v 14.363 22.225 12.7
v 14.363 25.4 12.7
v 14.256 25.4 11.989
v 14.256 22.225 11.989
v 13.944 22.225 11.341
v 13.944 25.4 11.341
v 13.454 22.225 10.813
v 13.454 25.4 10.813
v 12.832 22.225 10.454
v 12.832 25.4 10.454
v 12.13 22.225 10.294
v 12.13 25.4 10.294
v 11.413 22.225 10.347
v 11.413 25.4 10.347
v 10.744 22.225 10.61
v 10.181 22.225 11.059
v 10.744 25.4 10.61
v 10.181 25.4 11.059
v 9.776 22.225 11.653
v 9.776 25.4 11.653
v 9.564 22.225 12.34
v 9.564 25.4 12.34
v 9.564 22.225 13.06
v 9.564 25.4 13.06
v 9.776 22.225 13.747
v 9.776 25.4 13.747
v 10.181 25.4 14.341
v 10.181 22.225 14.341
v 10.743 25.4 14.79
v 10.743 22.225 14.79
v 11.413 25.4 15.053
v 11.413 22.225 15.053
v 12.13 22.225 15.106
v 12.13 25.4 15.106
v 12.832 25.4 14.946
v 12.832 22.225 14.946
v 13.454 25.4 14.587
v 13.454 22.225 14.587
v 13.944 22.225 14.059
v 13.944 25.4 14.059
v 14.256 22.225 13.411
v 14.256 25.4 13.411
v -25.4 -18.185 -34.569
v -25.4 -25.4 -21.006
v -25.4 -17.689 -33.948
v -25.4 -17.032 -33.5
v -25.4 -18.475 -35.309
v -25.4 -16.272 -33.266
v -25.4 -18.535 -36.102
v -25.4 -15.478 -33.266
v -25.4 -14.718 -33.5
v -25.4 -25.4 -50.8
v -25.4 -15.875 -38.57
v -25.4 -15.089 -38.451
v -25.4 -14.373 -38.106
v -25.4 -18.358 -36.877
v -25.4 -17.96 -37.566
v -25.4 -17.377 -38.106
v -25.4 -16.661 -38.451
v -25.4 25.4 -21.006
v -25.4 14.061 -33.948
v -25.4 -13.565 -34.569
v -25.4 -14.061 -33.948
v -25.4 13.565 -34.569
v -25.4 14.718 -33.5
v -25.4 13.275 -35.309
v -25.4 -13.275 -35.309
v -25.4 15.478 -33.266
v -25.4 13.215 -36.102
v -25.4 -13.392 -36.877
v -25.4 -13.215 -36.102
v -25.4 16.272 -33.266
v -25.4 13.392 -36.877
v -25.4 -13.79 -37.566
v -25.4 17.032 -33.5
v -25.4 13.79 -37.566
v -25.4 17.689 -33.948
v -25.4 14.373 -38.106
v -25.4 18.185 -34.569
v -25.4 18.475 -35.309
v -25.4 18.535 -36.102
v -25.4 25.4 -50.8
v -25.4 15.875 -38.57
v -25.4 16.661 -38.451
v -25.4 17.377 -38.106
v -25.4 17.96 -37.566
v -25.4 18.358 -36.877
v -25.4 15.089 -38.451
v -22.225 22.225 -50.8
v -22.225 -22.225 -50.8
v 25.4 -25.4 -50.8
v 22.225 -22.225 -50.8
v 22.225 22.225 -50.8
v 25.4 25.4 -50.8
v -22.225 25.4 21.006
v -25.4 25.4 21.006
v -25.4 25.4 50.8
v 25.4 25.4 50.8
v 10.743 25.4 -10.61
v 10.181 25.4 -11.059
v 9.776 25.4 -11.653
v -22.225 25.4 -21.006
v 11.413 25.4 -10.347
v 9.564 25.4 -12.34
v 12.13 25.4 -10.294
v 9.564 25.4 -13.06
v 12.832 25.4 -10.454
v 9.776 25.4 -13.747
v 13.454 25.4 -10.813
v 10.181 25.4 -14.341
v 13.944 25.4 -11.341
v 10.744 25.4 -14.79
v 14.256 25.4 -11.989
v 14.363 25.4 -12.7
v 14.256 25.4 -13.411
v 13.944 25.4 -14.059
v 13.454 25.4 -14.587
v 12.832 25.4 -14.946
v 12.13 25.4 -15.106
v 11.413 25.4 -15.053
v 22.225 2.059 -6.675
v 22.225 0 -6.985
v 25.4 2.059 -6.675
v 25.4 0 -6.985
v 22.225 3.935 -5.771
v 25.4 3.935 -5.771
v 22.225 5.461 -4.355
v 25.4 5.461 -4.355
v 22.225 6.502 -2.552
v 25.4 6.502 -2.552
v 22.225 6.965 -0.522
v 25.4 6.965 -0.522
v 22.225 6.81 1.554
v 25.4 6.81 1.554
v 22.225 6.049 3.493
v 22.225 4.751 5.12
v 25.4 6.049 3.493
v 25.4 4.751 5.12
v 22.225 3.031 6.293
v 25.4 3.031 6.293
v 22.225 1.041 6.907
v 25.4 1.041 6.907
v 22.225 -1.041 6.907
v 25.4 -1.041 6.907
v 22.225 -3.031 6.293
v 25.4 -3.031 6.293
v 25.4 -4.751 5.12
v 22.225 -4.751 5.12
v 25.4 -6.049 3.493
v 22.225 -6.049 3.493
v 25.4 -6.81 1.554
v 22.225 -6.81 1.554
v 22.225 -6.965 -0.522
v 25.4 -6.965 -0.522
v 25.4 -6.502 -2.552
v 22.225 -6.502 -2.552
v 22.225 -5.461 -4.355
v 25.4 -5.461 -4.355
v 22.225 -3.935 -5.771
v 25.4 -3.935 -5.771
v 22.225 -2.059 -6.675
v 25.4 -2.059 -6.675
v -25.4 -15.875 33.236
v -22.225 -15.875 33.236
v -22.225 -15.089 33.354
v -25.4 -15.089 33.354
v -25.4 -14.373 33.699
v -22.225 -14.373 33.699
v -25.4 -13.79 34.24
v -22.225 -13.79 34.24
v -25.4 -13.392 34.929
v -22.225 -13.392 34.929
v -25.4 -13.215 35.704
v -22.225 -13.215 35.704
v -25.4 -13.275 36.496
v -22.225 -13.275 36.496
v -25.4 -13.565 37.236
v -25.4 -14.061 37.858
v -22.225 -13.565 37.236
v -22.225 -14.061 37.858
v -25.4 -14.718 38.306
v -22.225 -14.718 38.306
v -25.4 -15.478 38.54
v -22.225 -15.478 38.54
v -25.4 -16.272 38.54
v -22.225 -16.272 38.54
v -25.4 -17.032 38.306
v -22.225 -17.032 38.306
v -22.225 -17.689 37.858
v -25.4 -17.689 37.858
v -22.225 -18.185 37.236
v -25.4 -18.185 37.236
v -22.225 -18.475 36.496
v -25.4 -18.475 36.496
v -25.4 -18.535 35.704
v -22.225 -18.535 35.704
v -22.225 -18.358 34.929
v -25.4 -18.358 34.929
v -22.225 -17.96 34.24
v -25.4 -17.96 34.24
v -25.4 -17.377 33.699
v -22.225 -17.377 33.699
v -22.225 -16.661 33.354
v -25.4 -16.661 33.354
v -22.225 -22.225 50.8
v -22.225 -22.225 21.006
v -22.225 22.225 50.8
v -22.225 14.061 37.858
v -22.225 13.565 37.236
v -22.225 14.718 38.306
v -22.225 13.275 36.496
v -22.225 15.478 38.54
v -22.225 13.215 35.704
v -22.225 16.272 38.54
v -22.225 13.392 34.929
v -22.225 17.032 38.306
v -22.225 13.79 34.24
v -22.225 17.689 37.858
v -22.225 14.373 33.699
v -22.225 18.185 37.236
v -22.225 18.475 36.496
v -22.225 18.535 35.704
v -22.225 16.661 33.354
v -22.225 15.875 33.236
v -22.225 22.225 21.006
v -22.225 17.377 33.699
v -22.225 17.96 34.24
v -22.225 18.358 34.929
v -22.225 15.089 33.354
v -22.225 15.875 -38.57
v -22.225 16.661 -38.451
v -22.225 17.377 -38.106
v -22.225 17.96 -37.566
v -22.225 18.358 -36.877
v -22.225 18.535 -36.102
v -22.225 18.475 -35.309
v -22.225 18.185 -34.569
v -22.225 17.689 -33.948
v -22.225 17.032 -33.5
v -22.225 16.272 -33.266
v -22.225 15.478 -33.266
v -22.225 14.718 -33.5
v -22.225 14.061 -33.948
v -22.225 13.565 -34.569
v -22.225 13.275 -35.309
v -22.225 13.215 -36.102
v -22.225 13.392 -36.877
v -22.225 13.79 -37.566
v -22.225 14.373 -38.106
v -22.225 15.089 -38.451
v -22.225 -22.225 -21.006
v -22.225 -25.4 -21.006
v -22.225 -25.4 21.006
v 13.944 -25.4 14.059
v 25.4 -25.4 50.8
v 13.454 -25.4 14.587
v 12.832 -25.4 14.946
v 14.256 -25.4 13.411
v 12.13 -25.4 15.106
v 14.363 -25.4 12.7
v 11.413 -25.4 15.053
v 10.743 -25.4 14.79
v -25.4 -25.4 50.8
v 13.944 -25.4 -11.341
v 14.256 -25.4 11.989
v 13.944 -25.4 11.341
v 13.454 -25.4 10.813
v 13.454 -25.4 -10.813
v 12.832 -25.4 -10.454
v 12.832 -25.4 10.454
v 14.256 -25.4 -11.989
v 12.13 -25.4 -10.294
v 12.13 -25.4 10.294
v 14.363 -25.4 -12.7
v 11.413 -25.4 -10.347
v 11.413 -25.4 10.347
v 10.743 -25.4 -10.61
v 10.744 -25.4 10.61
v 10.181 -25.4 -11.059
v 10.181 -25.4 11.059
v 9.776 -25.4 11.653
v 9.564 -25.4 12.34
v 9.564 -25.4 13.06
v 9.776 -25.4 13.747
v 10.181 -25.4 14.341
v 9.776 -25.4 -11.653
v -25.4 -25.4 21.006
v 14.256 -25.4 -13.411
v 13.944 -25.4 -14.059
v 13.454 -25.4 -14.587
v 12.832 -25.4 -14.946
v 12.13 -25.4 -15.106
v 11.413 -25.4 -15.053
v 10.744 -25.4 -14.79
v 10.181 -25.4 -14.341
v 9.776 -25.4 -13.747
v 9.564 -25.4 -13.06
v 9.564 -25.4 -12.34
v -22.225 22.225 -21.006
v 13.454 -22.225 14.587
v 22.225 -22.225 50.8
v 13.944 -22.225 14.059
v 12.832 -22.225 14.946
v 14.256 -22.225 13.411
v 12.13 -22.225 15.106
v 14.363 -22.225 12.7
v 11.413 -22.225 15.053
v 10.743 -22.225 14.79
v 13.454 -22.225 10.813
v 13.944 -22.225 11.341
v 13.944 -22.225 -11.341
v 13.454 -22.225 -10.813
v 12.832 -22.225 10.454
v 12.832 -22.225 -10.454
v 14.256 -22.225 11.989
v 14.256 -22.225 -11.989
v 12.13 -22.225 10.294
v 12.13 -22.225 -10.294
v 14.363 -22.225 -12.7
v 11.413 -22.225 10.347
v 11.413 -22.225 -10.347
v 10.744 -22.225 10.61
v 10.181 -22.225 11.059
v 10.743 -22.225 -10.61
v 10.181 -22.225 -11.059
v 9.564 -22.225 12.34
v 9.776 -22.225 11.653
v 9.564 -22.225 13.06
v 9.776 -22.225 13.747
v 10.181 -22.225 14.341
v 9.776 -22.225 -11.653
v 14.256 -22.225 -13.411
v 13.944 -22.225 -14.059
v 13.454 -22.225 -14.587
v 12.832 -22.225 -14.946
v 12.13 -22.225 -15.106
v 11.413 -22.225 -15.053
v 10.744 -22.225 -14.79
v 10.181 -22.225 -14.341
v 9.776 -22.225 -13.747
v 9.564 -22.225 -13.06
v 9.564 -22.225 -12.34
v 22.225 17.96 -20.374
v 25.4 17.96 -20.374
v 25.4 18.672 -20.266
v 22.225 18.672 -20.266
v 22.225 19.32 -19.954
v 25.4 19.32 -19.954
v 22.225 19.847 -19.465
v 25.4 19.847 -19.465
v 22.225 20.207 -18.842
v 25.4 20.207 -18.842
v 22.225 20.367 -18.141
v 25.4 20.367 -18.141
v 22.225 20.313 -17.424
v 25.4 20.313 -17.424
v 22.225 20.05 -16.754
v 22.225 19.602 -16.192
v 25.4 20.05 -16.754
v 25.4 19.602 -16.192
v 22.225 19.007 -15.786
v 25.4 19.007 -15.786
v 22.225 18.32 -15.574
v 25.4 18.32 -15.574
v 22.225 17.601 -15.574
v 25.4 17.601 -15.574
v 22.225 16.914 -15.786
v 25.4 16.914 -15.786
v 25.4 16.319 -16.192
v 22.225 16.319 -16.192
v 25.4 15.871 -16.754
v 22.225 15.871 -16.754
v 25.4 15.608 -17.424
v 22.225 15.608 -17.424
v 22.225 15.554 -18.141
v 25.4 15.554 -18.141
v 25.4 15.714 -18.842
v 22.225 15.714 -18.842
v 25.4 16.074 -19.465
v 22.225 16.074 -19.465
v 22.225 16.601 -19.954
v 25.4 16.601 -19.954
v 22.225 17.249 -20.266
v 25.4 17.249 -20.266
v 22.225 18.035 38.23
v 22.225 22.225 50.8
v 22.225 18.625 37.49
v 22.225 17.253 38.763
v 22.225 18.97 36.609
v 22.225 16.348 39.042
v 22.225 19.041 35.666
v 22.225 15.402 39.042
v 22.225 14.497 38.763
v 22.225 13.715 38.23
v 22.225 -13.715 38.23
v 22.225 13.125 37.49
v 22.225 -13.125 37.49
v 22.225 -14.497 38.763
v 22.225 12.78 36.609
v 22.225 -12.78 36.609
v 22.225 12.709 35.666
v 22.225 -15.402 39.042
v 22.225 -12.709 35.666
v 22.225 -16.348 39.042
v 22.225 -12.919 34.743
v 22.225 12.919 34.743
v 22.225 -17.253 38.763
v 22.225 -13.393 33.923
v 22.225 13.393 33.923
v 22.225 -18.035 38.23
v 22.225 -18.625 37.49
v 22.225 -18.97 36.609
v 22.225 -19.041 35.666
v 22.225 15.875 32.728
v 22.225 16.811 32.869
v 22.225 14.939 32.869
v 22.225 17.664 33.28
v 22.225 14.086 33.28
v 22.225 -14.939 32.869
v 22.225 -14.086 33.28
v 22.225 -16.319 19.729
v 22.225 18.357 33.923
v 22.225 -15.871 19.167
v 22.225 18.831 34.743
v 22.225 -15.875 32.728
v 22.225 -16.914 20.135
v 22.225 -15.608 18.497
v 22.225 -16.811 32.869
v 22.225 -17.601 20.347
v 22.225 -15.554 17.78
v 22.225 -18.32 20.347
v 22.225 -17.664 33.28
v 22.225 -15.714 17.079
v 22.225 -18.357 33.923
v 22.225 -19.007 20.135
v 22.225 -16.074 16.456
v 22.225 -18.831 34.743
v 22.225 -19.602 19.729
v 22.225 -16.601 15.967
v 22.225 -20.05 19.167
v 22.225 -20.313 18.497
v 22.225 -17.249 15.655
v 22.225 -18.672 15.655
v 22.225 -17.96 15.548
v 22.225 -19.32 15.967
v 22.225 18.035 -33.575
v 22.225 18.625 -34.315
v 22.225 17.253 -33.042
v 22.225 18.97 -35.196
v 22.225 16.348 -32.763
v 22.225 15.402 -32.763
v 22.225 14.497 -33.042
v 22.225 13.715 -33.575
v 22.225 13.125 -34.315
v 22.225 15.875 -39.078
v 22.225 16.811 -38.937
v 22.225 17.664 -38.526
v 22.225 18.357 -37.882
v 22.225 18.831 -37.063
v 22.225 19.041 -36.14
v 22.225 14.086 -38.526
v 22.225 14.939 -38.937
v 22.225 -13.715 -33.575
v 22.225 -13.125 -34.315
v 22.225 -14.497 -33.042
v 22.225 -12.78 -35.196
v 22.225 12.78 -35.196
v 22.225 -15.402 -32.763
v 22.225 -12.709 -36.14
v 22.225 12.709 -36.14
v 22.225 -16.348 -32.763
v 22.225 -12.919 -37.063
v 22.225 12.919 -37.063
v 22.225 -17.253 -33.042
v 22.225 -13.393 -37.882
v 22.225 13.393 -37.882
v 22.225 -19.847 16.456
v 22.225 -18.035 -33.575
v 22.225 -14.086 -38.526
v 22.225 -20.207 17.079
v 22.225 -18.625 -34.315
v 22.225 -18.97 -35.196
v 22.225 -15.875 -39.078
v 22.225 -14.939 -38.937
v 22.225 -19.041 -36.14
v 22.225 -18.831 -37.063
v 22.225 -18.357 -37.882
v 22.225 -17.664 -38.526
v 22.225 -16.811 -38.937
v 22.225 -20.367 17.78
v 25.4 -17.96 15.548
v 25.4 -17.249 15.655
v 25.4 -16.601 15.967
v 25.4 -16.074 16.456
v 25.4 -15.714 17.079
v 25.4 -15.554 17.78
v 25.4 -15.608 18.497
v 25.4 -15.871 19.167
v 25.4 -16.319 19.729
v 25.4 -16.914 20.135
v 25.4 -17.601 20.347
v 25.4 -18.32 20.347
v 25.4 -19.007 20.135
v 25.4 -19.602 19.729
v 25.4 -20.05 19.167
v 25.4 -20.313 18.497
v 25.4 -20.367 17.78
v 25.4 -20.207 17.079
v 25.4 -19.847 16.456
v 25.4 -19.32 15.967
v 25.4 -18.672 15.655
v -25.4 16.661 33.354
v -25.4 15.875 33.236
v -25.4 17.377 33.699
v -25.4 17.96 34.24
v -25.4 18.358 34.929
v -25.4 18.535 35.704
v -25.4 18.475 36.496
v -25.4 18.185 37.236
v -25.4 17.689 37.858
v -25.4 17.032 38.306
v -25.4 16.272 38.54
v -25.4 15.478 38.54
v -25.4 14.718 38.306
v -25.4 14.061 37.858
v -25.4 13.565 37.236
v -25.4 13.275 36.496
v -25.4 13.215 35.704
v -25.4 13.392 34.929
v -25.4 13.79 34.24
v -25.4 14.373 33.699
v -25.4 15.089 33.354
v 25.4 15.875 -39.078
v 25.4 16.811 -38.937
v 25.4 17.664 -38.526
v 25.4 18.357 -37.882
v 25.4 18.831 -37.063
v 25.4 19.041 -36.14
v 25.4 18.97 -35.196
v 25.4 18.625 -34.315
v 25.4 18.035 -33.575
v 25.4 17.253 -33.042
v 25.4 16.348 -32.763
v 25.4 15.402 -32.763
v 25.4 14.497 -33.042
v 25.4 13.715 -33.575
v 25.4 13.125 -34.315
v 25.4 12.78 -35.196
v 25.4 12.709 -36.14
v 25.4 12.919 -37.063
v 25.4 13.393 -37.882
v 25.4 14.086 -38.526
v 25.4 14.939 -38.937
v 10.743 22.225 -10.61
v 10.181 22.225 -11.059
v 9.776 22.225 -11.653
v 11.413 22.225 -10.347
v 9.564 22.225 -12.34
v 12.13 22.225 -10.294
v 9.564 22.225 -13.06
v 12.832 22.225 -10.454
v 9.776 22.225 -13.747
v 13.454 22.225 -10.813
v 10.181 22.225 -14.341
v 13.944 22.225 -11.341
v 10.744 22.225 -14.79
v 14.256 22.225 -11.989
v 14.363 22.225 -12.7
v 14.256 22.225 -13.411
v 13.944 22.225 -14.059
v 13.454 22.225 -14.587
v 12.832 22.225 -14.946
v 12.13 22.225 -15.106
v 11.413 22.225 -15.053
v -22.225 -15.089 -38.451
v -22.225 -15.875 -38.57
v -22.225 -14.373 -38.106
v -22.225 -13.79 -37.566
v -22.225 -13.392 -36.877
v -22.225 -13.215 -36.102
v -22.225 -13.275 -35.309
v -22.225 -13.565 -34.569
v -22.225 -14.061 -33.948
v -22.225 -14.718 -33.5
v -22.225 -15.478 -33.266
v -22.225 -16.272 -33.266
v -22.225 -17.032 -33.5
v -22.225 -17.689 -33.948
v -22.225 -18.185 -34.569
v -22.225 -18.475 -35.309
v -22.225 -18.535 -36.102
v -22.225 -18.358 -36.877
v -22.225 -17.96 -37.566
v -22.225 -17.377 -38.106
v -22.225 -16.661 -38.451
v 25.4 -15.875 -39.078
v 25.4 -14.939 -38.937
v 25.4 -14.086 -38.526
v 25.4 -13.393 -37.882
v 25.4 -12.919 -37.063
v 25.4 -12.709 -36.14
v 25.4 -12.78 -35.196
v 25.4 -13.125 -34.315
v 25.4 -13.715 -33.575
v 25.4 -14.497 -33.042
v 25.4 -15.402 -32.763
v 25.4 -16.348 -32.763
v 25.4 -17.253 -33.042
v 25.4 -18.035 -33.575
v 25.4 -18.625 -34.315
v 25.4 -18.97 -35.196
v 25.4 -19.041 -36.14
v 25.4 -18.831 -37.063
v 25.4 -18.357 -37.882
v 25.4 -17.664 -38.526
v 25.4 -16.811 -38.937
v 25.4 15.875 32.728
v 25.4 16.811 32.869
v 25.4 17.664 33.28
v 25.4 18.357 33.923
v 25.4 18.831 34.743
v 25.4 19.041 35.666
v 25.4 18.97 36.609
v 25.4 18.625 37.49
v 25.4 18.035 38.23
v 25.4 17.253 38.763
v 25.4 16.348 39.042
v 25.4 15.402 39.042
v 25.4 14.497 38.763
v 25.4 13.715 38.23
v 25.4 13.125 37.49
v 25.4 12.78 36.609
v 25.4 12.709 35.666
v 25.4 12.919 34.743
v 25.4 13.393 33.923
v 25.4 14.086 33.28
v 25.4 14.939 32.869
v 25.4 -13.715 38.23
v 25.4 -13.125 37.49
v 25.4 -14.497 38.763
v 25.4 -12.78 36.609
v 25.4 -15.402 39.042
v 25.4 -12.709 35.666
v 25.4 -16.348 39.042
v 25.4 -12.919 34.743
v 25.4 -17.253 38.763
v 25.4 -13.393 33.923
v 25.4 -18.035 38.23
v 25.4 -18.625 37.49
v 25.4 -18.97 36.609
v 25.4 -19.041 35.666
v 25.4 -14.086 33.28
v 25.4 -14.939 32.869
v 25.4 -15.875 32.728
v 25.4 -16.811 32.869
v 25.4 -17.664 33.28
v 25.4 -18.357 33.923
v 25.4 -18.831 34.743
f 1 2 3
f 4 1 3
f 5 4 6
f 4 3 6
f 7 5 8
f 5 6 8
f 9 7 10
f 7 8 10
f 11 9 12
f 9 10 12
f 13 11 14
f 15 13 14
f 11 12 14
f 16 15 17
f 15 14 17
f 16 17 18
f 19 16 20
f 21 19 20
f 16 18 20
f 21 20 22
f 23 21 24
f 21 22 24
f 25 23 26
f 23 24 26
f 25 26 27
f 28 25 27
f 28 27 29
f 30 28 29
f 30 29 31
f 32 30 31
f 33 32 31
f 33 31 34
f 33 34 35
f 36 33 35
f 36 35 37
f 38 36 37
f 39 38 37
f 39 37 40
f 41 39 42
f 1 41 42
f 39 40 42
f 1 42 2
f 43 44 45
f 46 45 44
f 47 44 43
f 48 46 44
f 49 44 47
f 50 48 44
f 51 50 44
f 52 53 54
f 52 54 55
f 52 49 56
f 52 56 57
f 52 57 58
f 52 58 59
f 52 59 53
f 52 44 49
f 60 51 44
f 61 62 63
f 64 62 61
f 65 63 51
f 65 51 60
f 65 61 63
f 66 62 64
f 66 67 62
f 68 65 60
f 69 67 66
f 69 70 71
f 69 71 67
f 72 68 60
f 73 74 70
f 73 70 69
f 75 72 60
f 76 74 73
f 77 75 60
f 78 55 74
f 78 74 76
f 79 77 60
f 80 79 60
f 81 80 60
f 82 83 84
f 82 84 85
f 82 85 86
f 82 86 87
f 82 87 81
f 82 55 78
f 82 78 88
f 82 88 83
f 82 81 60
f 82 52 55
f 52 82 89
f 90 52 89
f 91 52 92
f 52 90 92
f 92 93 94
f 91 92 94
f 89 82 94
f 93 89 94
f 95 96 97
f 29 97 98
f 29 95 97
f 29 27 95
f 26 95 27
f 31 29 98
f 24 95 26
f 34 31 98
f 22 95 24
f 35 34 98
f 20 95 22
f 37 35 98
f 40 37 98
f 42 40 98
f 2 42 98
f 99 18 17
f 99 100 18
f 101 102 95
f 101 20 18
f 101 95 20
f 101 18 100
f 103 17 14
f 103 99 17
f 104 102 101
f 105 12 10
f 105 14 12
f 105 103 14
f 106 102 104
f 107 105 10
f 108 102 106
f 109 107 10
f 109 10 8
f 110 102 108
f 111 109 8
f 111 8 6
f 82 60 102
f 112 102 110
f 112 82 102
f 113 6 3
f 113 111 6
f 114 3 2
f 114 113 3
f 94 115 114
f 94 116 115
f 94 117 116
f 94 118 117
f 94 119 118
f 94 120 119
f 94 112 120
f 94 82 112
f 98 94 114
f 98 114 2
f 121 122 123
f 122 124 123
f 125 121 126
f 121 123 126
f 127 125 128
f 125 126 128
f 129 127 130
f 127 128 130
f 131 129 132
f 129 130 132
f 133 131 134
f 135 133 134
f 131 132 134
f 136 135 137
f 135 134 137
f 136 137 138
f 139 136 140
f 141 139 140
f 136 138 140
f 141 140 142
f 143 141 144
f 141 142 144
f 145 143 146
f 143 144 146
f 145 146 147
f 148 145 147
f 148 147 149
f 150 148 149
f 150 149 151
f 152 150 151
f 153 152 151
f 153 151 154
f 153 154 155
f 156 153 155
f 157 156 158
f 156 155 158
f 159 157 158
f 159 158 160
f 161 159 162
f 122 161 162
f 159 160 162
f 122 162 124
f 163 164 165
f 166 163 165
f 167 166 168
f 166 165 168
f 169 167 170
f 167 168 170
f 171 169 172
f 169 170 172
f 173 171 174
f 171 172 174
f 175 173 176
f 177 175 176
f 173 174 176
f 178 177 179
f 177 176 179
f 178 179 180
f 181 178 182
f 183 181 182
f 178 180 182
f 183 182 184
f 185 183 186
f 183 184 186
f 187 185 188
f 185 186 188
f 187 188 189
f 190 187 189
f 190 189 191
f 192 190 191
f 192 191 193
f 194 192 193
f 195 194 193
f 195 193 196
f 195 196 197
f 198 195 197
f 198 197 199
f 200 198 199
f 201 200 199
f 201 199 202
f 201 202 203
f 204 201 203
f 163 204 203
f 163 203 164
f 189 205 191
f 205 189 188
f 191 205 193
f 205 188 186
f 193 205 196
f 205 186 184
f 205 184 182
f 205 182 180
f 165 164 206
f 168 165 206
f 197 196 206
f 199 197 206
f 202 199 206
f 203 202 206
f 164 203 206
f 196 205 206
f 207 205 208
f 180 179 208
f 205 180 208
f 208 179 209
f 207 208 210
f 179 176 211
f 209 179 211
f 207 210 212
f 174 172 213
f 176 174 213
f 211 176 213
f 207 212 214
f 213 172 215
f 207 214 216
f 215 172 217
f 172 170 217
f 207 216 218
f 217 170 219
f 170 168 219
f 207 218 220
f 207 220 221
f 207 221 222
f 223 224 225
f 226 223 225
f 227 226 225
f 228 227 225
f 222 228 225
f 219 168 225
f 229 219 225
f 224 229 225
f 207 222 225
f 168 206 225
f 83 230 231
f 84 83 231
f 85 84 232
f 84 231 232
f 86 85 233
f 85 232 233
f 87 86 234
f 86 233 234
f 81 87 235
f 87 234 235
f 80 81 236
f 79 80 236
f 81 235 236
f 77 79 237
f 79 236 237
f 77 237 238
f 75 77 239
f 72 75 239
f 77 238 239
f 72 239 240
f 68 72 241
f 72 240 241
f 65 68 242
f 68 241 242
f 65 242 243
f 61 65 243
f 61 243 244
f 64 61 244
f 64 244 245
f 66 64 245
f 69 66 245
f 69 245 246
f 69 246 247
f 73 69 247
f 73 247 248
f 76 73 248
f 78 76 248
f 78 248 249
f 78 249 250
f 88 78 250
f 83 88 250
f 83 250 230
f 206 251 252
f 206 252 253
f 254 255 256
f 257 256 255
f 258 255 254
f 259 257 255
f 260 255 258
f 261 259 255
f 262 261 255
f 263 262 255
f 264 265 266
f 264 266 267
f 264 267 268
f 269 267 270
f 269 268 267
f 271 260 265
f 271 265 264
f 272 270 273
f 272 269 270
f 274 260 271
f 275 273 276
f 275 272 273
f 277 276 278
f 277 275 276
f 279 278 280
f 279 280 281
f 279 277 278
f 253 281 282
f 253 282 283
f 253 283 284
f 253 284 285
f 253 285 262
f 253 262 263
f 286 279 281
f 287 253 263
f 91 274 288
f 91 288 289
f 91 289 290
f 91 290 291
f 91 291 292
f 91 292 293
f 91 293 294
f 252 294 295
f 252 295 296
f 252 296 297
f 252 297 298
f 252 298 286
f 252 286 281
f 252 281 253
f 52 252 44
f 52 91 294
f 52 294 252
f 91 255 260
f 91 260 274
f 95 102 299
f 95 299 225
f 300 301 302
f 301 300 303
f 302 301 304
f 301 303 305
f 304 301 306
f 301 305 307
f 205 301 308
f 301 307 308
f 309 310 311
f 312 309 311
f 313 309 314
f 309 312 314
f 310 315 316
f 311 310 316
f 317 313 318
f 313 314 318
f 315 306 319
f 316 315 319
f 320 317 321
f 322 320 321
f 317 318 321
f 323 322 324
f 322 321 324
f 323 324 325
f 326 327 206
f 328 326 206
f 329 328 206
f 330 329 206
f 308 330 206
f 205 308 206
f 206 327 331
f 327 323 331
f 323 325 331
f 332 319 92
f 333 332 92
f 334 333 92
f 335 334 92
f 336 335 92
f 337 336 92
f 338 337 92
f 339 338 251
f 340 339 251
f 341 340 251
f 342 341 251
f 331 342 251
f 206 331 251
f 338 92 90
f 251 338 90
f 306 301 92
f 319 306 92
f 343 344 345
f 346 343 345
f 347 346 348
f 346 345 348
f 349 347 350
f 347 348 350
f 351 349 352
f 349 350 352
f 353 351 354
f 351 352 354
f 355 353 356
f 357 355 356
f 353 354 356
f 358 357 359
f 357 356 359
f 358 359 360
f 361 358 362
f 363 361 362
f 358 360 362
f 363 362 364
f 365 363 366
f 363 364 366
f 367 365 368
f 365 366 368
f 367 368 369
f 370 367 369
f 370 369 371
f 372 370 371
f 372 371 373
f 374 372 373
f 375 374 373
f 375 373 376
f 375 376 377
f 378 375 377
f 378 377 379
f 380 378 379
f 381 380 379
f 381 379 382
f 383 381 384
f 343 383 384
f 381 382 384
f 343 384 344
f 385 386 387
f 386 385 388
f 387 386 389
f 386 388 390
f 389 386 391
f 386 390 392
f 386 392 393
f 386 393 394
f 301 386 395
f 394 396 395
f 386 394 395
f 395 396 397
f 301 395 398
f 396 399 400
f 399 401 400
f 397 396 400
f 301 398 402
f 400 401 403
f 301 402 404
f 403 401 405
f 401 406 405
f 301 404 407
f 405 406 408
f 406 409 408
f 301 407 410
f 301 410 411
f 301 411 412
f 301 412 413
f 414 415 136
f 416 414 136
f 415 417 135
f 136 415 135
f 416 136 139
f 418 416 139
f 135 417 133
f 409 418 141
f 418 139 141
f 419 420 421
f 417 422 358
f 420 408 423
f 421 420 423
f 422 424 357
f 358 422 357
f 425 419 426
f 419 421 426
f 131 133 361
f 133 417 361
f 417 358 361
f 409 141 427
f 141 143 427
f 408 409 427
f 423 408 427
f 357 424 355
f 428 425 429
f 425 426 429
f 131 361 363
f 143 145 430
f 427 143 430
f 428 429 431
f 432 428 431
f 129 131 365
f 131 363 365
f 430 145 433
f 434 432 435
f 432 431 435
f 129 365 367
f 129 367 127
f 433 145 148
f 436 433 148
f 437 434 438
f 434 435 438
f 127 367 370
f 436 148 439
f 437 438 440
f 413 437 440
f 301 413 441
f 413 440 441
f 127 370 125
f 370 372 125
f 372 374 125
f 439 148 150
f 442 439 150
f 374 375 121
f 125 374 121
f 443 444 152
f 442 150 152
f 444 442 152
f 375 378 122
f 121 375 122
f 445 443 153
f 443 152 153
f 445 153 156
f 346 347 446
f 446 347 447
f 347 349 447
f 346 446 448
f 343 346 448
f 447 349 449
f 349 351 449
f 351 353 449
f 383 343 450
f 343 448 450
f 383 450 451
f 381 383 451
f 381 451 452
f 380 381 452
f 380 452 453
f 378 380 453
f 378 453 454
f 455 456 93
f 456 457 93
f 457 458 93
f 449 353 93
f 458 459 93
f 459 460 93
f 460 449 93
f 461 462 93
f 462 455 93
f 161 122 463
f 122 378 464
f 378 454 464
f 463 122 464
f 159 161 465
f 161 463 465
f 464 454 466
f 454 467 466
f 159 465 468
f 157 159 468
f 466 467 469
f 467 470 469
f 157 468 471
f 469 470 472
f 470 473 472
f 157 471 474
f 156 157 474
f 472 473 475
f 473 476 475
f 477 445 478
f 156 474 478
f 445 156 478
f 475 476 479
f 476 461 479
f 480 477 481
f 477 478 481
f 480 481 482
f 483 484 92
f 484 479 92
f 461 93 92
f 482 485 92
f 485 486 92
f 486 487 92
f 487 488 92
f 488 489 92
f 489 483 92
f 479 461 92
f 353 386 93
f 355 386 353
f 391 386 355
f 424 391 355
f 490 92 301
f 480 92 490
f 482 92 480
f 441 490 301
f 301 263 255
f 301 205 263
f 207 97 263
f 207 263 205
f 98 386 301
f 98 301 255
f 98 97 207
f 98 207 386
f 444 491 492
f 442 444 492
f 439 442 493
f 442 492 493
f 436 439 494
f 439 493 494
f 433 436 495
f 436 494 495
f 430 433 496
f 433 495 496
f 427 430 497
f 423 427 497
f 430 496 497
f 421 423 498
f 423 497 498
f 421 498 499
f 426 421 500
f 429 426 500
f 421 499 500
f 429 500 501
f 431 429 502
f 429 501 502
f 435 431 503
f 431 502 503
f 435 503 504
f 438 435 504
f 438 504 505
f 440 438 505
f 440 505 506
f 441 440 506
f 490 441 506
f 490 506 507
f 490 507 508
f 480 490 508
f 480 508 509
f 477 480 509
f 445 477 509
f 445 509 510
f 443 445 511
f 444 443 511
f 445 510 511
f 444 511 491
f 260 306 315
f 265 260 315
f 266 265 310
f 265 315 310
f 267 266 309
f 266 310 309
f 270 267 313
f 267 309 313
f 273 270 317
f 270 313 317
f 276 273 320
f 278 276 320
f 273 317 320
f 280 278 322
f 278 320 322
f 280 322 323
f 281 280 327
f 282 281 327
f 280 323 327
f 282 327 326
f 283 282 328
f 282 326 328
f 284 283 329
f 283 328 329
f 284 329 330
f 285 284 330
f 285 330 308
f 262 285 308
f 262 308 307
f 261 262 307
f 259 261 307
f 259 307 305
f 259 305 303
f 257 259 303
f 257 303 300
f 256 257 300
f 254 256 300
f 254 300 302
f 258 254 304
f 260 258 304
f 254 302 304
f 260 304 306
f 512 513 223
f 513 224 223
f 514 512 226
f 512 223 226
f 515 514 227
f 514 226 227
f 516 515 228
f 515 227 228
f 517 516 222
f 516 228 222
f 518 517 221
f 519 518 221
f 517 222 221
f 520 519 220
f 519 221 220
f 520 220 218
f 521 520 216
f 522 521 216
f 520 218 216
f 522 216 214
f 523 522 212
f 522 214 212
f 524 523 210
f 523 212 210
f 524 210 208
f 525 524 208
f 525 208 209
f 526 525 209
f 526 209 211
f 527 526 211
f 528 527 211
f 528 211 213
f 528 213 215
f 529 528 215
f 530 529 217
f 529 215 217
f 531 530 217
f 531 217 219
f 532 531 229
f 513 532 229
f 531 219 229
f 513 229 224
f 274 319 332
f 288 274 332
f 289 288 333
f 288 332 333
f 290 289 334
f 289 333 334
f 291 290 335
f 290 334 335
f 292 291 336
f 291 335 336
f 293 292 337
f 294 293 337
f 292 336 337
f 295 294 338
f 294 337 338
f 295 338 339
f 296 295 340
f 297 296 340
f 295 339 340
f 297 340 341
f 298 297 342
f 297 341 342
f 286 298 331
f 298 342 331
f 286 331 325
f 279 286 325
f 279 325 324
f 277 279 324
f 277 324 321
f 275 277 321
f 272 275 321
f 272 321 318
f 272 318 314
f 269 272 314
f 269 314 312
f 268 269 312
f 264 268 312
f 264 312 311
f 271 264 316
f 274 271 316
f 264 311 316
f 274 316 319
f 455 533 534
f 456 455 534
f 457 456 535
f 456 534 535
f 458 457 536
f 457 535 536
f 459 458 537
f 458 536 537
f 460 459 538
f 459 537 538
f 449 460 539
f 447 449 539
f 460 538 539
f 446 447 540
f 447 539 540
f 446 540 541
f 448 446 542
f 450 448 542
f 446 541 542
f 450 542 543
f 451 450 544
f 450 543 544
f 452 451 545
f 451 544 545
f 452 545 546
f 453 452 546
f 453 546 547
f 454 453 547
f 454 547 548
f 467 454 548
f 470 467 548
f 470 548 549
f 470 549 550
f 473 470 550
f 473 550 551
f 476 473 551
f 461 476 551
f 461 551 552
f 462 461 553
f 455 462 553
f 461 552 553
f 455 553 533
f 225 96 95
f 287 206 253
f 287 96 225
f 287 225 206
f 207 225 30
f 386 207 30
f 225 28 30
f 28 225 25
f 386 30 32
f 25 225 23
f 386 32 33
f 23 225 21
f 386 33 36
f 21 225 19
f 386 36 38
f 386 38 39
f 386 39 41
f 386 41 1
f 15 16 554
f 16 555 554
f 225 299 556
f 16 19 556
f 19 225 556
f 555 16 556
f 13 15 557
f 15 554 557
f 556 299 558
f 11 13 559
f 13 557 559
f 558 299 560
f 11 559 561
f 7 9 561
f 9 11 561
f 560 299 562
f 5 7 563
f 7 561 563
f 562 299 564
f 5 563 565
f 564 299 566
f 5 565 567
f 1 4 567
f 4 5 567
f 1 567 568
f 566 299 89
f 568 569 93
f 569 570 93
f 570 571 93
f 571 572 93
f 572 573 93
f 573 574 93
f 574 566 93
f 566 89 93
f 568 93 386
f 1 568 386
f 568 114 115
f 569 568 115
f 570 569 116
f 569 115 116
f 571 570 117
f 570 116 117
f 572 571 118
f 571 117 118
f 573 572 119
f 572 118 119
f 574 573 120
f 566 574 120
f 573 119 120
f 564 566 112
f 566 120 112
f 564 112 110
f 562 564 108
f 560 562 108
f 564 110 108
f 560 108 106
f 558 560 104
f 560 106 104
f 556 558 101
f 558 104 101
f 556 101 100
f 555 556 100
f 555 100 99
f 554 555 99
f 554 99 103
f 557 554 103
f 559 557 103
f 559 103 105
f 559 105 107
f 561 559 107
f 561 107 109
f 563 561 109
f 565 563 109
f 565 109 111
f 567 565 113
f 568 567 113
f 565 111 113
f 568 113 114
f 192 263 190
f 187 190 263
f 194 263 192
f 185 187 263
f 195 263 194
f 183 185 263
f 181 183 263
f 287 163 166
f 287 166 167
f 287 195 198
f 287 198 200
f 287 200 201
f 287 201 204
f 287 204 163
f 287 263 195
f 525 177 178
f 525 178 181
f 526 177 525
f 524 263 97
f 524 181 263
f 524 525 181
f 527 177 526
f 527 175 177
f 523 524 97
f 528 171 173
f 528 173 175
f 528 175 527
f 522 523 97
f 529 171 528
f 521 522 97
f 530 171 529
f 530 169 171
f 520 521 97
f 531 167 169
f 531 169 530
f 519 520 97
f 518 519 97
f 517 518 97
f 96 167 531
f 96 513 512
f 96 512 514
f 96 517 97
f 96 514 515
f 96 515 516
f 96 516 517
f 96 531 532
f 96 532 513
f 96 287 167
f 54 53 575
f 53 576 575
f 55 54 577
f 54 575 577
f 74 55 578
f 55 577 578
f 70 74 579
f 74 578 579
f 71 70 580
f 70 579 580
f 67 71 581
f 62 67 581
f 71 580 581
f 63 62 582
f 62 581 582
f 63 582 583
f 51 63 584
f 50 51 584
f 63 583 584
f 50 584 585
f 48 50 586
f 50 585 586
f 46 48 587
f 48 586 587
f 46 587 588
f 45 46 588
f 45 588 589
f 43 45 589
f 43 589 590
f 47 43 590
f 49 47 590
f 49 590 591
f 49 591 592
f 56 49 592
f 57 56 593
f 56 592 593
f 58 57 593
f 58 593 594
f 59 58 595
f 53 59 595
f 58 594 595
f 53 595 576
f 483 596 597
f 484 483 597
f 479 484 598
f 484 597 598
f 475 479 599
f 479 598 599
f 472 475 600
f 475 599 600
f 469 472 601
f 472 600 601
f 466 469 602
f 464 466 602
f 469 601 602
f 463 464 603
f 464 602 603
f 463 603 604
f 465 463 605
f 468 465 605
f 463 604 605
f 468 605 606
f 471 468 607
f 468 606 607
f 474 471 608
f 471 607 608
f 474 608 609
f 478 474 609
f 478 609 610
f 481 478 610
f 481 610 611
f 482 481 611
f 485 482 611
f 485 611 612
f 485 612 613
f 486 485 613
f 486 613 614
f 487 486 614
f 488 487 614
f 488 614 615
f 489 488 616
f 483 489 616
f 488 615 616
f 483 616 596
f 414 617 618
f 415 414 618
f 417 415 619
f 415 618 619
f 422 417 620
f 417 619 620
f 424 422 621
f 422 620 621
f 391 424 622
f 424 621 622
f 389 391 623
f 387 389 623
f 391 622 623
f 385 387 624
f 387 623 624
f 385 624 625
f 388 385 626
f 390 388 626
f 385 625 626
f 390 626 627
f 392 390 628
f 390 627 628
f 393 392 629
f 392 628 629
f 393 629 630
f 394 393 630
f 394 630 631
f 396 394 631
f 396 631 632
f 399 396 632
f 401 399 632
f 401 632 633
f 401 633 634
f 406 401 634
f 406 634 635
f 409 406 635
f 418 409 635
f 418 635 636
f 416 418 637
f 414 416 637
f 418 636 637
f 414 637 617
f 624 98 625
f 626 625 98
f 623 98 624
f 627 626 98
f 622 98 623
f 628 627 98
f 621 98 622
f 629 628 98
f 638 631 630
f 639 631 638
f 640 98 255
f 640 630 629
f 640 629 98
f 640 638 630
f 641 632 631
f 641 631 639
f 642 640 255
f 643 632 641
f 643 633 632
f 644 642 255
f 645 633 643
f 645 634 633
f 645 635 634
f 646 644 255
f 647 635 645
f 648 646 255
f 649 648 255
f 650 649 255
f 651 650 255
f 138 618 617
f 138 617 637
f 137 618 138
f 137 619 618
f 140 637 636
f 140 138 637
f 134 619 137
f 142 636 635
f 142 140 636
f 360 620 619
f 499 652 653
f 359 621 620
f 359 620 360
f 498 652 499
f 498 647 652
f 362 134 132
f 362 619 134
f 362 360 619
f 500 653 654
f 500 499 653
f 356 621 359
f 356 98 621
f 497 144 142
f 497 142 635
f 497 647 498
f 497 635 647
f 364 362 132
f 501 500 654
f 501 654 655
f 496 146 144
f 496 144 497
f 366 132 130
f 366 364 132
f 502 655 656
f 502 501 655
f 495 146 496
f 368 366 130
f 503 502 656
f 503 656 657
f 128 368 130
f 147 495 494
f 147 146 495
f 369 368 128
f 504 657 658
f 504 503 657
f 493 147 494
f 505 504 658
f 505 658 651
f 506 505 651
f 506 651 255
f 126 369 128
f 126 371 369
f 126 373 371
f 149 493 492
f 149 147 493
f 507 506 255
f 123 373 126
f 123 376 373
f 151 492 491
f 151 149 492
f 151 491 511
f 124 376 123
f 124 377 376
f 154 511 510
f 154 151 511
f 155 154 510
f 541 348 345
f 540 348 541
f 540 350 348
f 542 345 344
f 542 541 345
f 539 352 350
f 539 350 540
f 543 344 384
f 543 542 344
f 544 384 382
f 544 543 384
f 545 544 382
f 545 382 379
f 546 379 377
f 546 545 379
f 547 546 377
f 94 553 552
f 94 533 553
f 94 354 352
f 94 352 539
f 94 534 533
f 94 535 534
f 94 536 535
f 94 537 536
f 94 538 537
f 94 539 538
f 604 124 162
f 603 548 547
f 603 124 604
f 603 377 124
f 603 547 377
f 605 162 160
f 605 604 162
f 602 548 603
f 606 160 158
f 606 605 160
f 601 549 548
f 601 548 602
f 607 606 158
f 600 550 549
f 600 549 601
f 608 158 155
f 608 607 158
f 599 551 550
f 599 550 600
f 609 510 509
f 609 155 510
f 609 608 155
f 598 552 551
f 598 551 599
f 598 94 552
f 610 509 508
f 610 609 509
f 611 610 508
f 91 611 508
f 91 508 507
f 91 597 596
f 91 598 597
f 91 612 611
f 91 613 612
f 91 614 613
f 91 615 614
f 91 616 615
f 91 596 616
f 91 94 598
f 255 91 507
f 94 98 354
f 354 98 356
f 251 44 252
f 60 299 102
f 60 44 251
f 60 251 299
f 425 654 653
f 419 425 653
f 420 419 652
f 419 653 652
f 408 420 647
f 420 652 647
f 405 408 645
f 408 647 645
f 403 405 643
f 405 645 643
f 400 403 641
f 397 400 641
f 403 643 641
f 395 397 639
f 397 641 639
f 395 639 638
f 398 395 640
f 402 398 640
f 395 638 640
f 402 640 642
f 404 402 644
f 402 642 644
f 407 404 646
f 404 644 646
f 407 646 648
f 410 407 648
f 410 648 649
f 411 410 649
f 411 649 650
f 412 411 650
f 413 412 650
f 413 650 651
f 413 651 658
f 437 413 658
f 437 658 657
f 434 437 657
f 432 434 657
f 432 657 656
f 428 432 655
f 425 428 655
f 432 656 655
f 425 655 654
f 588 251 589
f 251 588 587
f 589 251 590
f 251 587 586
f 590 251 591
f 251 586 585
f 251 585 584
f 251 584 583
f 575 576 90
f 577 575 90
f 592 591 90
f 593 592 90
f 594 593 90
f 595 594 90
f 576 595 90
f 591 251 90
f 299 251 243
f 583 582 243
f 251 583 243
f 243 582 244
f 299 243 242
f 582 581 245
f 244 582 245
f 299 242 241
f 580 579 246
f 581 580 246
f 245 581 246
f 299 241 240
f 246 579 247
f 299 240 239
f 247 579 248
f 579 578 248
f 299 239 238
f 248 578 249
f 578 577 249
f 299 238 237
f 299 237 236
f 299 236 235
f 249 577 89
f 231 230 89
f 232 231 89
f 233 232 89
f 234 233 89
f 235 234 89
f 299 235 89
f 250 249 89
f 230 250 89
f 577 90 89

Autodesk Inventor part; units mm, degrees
ref_plane "YZ Plane" through (0, 0, 0) normal (1, 0, 0) x (0, 1, 0)
ref_plane "XZ Plane" through (0, 0, 0) normal (0, 1, 0) x (-1, 0, 0)
ref_plane "XY Plane" through (0, 0, 0) normal (0, 0, 1) x (1, 0, 0)
sketch "Sketch1" plane through (0, 0, 0) normal (0, 0, 1) x (1, 0, 0)
  line L0 (-35.56, 0) -> (35.56, 0) construction
  line L1 (0, -35.56) -> (0, 35.56) construction
  line L2 (-25.4, 25.4) -> (25.4, 25.4)
  line L3 (25.4, 25.4) -> (25.4, -25.4)
  line L4 (25.4, -25.4) -> (-25.4, -25.4)
  line L5 (-25.4, -25.4) -> (-25.4, 25.4)
  line L6 (-22.225, 22.225) -> (22.225, 22.225)
  line L7 (22.225, 22.225) -> (22.225, -22.225)
  line L8 (22.225, -22.225) -> (-22.225, -22.225)
  line L9 (-22.225, -22.225) -> (-22.225, 22.225)
  point P0 (0, 0)
  point P1 (-25.4, 0)
  point P2 (0, 25.4)
  point P3 (-22.225, 0)
  point P4 (0, 22.225)
  dimension "d0" = 50.8
  dimension "d1" = 3.175
  dimension "d11" = 50.8
  dimension "d12" = 3.175
extrude "Extrusion1" add sketch "Sketch1" along normal mid plane 101.6
sketch "Sketch6" plane through (-25.4, -25.4, 50.8) normal (-1, 0, 0) x (0, 0, 1)
  line L0 (-121.92, 25.4) -> (20.32, 25.4) construction
  line L1 (-50.8, -10.16) -> (-50.8, 60.96) construction
  line L2 (-71.8058, 50.8) -> (-29.7942, 50.8)
  line L3 (-29.7942, 50.8) -> (-29.7942, 0)
  line L4 (-29.7942, 0) -> (-71.8058, 0)
  line L5 (-71.8058, 0) -> (-71.8058, 50.8)
  line L6 (-101.6, 50.8) -> (0, 50.8) construction
  point P0 (-50.8, 25.4)
  point P1 (-71.8058, 25.4)
  point P2 (-50.8, 50.8)
  dimension "d23" = 42.0116
extrude "Extrusion7" cut sketch "Sketch6" against normal blind 3.175
sketch "Sketch7" plane through (-25.4, 25.4, 50.8) normal (0, 1, 0) x (1, 0, 0)
  circle A0 centre (37.35, 38.1) radius 2.0193 construction
  circle A1 centre (37.35, 63.5) radius 2.0193 construction
  circle A2 centre (37.35, 63.5) radius 2.413
  circle A3 centre (37.35, 38.1) radius 2.413
  point P0 (25.4, 50.8)
  dimension "d39" = 4.826
sketch "Sketch8" plane through (25.4, -25.4, 50.8) normal (1, 0, 0) x (0, 0, -1)
  line L0 (43.6, 4.4) -> (58, 4.4) construction
  line L1 (58, 4.4) -> (59.225, 3.175) construction
  line L2 (59.225, 3.175) -> (64.8, 3.175) construction
  line L3 (64.8, 9.4) -> (64.8, 3.175) construction
  arc A0 (66.8, 11.4) -> (64.8, 9.4) centre (66.8, 9.4) ccw construction
  line L4 (71.8, 11.4) -> (66.8, 11.4) construction
  line L5 (71.8, 11.4) -> (71.8, 45.4) construction
  arc A1 (71.8, 45.4) -> (70.8, 46.4) centre (50.8, 25.4) ccw construction
  line L6 (70.8, 46.4) -> (69, 46.4) construction
  line L7 (69, 46.4) -> (67.775, 47.625) construction
  line L8 (67.775, 47.625) -> (59.225, 47.625) construction
  line L9 (59.225, 47.625) -> (58, 46.4) construction
  line L10 (58, 46.4) -> (43.6, 46.4) construction
  line L11 (43.6, 46.4) -> (42.375, 47.625) construction
  line L12 (42.375, 47.625) -> (36.8, 47.625) construction
  line L13 (36.8, 41.4) -> (36.8, 47.625) construction
  arc A2 (34.8, 39.4) -> (36.8, 41.4) centre (34.8, 41.4) ccw construction
  line L14 (29.8, 39.4) -> (34.8, 39.4) construction
  line L15 (29.8, 39.4) -> (29.8, 5.4) construction
  arc A3 (29.8, 5.4) -> (30.8, 4.4) centre (50.8, 25.4) ccw construction
  line L16 (30.8, 4.4) -> (32.6, 4.4) construction
  line L17 (32.6, 4.4) -> (33.825, 3.175) construction
  line L18 (33.825, 3.175) -> (42.375, 3.175) construction
  line L19 (42.375, 3.175) -> (43.6, 4.4) construction
  circle A4 centre (50.8, 25.4) radius 14.195 construction
  circle A5 centre (32.8395, 7.4395) radius 2.0193 construction
  circle A6 centre (68.7605, 43.3605) radius 2.0193 construction
  circle A7 centre (50.8, 25.4) radius 6.985
  circle A8 centre (32.8395, 7.4395) radius 2.413
  circle A9 centre (68.7605, 43.3605) radius 2.413
  point P0 (50.8, 25.4)
  dimension "d28" = 13.97
  dimension "d36" = 4.826
sketch "Sketch9" plane through (-22.225, -22.225, 50.8) normal (1, 0, 0) x (0, 0, -1)
  circle A0 centre (86.7029, 6.35) radius 3.175 construction
  circle A1 centre (86.7029, 38.1) radius 3.175 construction
  circle A2 centre (14.8971, 6.35) radius 3.175 construction
  circle A3 centre (14.8971, 38.1) radius 3.175 construction
  circle A4 centre (86.7029, 6.35) radius 2.667
  circle A5 centre (14.8971, 6.35) radius 2.667
  circle A6 centre (86.7029, 38.1) radius 2.667
  circle A7 centre (14.8971, 38.1) radius 2.667
  point P0 (50.8, 22.225)
  dimension "d31" = 5.334
extrude "Extrusion10" cut sketch "Sketch9" against normal through all
sketch "Sketch10" plane through (25.4, -25.4, 50.8) normal (1, 0, 0) x (0, 0, -1)
  circle A0 centre (14.8971, 9.525) radius 3.175 projected
  circle A1 centre (86.7029, 9.525) radius 3.175 projected
  circle A2 centre (86.7029, 41.275) radius 3.175 projected
  circle A3 centre (14.8971, 41.275) radius 3.175 projected
  point P0 (50.8, 25.4)
extrude "Extrusion11" cut sketch "Sketch10" against normal up to next
extrude "Extrusion12" cut sketch "Sketch8" against normal up to next
extrude "Extrusion13" cut sketch "Sketch7" against normal through all
equation "\"d12\" = d1"
properties part number "Arm 4 inch" material "Aluminum 6061"
